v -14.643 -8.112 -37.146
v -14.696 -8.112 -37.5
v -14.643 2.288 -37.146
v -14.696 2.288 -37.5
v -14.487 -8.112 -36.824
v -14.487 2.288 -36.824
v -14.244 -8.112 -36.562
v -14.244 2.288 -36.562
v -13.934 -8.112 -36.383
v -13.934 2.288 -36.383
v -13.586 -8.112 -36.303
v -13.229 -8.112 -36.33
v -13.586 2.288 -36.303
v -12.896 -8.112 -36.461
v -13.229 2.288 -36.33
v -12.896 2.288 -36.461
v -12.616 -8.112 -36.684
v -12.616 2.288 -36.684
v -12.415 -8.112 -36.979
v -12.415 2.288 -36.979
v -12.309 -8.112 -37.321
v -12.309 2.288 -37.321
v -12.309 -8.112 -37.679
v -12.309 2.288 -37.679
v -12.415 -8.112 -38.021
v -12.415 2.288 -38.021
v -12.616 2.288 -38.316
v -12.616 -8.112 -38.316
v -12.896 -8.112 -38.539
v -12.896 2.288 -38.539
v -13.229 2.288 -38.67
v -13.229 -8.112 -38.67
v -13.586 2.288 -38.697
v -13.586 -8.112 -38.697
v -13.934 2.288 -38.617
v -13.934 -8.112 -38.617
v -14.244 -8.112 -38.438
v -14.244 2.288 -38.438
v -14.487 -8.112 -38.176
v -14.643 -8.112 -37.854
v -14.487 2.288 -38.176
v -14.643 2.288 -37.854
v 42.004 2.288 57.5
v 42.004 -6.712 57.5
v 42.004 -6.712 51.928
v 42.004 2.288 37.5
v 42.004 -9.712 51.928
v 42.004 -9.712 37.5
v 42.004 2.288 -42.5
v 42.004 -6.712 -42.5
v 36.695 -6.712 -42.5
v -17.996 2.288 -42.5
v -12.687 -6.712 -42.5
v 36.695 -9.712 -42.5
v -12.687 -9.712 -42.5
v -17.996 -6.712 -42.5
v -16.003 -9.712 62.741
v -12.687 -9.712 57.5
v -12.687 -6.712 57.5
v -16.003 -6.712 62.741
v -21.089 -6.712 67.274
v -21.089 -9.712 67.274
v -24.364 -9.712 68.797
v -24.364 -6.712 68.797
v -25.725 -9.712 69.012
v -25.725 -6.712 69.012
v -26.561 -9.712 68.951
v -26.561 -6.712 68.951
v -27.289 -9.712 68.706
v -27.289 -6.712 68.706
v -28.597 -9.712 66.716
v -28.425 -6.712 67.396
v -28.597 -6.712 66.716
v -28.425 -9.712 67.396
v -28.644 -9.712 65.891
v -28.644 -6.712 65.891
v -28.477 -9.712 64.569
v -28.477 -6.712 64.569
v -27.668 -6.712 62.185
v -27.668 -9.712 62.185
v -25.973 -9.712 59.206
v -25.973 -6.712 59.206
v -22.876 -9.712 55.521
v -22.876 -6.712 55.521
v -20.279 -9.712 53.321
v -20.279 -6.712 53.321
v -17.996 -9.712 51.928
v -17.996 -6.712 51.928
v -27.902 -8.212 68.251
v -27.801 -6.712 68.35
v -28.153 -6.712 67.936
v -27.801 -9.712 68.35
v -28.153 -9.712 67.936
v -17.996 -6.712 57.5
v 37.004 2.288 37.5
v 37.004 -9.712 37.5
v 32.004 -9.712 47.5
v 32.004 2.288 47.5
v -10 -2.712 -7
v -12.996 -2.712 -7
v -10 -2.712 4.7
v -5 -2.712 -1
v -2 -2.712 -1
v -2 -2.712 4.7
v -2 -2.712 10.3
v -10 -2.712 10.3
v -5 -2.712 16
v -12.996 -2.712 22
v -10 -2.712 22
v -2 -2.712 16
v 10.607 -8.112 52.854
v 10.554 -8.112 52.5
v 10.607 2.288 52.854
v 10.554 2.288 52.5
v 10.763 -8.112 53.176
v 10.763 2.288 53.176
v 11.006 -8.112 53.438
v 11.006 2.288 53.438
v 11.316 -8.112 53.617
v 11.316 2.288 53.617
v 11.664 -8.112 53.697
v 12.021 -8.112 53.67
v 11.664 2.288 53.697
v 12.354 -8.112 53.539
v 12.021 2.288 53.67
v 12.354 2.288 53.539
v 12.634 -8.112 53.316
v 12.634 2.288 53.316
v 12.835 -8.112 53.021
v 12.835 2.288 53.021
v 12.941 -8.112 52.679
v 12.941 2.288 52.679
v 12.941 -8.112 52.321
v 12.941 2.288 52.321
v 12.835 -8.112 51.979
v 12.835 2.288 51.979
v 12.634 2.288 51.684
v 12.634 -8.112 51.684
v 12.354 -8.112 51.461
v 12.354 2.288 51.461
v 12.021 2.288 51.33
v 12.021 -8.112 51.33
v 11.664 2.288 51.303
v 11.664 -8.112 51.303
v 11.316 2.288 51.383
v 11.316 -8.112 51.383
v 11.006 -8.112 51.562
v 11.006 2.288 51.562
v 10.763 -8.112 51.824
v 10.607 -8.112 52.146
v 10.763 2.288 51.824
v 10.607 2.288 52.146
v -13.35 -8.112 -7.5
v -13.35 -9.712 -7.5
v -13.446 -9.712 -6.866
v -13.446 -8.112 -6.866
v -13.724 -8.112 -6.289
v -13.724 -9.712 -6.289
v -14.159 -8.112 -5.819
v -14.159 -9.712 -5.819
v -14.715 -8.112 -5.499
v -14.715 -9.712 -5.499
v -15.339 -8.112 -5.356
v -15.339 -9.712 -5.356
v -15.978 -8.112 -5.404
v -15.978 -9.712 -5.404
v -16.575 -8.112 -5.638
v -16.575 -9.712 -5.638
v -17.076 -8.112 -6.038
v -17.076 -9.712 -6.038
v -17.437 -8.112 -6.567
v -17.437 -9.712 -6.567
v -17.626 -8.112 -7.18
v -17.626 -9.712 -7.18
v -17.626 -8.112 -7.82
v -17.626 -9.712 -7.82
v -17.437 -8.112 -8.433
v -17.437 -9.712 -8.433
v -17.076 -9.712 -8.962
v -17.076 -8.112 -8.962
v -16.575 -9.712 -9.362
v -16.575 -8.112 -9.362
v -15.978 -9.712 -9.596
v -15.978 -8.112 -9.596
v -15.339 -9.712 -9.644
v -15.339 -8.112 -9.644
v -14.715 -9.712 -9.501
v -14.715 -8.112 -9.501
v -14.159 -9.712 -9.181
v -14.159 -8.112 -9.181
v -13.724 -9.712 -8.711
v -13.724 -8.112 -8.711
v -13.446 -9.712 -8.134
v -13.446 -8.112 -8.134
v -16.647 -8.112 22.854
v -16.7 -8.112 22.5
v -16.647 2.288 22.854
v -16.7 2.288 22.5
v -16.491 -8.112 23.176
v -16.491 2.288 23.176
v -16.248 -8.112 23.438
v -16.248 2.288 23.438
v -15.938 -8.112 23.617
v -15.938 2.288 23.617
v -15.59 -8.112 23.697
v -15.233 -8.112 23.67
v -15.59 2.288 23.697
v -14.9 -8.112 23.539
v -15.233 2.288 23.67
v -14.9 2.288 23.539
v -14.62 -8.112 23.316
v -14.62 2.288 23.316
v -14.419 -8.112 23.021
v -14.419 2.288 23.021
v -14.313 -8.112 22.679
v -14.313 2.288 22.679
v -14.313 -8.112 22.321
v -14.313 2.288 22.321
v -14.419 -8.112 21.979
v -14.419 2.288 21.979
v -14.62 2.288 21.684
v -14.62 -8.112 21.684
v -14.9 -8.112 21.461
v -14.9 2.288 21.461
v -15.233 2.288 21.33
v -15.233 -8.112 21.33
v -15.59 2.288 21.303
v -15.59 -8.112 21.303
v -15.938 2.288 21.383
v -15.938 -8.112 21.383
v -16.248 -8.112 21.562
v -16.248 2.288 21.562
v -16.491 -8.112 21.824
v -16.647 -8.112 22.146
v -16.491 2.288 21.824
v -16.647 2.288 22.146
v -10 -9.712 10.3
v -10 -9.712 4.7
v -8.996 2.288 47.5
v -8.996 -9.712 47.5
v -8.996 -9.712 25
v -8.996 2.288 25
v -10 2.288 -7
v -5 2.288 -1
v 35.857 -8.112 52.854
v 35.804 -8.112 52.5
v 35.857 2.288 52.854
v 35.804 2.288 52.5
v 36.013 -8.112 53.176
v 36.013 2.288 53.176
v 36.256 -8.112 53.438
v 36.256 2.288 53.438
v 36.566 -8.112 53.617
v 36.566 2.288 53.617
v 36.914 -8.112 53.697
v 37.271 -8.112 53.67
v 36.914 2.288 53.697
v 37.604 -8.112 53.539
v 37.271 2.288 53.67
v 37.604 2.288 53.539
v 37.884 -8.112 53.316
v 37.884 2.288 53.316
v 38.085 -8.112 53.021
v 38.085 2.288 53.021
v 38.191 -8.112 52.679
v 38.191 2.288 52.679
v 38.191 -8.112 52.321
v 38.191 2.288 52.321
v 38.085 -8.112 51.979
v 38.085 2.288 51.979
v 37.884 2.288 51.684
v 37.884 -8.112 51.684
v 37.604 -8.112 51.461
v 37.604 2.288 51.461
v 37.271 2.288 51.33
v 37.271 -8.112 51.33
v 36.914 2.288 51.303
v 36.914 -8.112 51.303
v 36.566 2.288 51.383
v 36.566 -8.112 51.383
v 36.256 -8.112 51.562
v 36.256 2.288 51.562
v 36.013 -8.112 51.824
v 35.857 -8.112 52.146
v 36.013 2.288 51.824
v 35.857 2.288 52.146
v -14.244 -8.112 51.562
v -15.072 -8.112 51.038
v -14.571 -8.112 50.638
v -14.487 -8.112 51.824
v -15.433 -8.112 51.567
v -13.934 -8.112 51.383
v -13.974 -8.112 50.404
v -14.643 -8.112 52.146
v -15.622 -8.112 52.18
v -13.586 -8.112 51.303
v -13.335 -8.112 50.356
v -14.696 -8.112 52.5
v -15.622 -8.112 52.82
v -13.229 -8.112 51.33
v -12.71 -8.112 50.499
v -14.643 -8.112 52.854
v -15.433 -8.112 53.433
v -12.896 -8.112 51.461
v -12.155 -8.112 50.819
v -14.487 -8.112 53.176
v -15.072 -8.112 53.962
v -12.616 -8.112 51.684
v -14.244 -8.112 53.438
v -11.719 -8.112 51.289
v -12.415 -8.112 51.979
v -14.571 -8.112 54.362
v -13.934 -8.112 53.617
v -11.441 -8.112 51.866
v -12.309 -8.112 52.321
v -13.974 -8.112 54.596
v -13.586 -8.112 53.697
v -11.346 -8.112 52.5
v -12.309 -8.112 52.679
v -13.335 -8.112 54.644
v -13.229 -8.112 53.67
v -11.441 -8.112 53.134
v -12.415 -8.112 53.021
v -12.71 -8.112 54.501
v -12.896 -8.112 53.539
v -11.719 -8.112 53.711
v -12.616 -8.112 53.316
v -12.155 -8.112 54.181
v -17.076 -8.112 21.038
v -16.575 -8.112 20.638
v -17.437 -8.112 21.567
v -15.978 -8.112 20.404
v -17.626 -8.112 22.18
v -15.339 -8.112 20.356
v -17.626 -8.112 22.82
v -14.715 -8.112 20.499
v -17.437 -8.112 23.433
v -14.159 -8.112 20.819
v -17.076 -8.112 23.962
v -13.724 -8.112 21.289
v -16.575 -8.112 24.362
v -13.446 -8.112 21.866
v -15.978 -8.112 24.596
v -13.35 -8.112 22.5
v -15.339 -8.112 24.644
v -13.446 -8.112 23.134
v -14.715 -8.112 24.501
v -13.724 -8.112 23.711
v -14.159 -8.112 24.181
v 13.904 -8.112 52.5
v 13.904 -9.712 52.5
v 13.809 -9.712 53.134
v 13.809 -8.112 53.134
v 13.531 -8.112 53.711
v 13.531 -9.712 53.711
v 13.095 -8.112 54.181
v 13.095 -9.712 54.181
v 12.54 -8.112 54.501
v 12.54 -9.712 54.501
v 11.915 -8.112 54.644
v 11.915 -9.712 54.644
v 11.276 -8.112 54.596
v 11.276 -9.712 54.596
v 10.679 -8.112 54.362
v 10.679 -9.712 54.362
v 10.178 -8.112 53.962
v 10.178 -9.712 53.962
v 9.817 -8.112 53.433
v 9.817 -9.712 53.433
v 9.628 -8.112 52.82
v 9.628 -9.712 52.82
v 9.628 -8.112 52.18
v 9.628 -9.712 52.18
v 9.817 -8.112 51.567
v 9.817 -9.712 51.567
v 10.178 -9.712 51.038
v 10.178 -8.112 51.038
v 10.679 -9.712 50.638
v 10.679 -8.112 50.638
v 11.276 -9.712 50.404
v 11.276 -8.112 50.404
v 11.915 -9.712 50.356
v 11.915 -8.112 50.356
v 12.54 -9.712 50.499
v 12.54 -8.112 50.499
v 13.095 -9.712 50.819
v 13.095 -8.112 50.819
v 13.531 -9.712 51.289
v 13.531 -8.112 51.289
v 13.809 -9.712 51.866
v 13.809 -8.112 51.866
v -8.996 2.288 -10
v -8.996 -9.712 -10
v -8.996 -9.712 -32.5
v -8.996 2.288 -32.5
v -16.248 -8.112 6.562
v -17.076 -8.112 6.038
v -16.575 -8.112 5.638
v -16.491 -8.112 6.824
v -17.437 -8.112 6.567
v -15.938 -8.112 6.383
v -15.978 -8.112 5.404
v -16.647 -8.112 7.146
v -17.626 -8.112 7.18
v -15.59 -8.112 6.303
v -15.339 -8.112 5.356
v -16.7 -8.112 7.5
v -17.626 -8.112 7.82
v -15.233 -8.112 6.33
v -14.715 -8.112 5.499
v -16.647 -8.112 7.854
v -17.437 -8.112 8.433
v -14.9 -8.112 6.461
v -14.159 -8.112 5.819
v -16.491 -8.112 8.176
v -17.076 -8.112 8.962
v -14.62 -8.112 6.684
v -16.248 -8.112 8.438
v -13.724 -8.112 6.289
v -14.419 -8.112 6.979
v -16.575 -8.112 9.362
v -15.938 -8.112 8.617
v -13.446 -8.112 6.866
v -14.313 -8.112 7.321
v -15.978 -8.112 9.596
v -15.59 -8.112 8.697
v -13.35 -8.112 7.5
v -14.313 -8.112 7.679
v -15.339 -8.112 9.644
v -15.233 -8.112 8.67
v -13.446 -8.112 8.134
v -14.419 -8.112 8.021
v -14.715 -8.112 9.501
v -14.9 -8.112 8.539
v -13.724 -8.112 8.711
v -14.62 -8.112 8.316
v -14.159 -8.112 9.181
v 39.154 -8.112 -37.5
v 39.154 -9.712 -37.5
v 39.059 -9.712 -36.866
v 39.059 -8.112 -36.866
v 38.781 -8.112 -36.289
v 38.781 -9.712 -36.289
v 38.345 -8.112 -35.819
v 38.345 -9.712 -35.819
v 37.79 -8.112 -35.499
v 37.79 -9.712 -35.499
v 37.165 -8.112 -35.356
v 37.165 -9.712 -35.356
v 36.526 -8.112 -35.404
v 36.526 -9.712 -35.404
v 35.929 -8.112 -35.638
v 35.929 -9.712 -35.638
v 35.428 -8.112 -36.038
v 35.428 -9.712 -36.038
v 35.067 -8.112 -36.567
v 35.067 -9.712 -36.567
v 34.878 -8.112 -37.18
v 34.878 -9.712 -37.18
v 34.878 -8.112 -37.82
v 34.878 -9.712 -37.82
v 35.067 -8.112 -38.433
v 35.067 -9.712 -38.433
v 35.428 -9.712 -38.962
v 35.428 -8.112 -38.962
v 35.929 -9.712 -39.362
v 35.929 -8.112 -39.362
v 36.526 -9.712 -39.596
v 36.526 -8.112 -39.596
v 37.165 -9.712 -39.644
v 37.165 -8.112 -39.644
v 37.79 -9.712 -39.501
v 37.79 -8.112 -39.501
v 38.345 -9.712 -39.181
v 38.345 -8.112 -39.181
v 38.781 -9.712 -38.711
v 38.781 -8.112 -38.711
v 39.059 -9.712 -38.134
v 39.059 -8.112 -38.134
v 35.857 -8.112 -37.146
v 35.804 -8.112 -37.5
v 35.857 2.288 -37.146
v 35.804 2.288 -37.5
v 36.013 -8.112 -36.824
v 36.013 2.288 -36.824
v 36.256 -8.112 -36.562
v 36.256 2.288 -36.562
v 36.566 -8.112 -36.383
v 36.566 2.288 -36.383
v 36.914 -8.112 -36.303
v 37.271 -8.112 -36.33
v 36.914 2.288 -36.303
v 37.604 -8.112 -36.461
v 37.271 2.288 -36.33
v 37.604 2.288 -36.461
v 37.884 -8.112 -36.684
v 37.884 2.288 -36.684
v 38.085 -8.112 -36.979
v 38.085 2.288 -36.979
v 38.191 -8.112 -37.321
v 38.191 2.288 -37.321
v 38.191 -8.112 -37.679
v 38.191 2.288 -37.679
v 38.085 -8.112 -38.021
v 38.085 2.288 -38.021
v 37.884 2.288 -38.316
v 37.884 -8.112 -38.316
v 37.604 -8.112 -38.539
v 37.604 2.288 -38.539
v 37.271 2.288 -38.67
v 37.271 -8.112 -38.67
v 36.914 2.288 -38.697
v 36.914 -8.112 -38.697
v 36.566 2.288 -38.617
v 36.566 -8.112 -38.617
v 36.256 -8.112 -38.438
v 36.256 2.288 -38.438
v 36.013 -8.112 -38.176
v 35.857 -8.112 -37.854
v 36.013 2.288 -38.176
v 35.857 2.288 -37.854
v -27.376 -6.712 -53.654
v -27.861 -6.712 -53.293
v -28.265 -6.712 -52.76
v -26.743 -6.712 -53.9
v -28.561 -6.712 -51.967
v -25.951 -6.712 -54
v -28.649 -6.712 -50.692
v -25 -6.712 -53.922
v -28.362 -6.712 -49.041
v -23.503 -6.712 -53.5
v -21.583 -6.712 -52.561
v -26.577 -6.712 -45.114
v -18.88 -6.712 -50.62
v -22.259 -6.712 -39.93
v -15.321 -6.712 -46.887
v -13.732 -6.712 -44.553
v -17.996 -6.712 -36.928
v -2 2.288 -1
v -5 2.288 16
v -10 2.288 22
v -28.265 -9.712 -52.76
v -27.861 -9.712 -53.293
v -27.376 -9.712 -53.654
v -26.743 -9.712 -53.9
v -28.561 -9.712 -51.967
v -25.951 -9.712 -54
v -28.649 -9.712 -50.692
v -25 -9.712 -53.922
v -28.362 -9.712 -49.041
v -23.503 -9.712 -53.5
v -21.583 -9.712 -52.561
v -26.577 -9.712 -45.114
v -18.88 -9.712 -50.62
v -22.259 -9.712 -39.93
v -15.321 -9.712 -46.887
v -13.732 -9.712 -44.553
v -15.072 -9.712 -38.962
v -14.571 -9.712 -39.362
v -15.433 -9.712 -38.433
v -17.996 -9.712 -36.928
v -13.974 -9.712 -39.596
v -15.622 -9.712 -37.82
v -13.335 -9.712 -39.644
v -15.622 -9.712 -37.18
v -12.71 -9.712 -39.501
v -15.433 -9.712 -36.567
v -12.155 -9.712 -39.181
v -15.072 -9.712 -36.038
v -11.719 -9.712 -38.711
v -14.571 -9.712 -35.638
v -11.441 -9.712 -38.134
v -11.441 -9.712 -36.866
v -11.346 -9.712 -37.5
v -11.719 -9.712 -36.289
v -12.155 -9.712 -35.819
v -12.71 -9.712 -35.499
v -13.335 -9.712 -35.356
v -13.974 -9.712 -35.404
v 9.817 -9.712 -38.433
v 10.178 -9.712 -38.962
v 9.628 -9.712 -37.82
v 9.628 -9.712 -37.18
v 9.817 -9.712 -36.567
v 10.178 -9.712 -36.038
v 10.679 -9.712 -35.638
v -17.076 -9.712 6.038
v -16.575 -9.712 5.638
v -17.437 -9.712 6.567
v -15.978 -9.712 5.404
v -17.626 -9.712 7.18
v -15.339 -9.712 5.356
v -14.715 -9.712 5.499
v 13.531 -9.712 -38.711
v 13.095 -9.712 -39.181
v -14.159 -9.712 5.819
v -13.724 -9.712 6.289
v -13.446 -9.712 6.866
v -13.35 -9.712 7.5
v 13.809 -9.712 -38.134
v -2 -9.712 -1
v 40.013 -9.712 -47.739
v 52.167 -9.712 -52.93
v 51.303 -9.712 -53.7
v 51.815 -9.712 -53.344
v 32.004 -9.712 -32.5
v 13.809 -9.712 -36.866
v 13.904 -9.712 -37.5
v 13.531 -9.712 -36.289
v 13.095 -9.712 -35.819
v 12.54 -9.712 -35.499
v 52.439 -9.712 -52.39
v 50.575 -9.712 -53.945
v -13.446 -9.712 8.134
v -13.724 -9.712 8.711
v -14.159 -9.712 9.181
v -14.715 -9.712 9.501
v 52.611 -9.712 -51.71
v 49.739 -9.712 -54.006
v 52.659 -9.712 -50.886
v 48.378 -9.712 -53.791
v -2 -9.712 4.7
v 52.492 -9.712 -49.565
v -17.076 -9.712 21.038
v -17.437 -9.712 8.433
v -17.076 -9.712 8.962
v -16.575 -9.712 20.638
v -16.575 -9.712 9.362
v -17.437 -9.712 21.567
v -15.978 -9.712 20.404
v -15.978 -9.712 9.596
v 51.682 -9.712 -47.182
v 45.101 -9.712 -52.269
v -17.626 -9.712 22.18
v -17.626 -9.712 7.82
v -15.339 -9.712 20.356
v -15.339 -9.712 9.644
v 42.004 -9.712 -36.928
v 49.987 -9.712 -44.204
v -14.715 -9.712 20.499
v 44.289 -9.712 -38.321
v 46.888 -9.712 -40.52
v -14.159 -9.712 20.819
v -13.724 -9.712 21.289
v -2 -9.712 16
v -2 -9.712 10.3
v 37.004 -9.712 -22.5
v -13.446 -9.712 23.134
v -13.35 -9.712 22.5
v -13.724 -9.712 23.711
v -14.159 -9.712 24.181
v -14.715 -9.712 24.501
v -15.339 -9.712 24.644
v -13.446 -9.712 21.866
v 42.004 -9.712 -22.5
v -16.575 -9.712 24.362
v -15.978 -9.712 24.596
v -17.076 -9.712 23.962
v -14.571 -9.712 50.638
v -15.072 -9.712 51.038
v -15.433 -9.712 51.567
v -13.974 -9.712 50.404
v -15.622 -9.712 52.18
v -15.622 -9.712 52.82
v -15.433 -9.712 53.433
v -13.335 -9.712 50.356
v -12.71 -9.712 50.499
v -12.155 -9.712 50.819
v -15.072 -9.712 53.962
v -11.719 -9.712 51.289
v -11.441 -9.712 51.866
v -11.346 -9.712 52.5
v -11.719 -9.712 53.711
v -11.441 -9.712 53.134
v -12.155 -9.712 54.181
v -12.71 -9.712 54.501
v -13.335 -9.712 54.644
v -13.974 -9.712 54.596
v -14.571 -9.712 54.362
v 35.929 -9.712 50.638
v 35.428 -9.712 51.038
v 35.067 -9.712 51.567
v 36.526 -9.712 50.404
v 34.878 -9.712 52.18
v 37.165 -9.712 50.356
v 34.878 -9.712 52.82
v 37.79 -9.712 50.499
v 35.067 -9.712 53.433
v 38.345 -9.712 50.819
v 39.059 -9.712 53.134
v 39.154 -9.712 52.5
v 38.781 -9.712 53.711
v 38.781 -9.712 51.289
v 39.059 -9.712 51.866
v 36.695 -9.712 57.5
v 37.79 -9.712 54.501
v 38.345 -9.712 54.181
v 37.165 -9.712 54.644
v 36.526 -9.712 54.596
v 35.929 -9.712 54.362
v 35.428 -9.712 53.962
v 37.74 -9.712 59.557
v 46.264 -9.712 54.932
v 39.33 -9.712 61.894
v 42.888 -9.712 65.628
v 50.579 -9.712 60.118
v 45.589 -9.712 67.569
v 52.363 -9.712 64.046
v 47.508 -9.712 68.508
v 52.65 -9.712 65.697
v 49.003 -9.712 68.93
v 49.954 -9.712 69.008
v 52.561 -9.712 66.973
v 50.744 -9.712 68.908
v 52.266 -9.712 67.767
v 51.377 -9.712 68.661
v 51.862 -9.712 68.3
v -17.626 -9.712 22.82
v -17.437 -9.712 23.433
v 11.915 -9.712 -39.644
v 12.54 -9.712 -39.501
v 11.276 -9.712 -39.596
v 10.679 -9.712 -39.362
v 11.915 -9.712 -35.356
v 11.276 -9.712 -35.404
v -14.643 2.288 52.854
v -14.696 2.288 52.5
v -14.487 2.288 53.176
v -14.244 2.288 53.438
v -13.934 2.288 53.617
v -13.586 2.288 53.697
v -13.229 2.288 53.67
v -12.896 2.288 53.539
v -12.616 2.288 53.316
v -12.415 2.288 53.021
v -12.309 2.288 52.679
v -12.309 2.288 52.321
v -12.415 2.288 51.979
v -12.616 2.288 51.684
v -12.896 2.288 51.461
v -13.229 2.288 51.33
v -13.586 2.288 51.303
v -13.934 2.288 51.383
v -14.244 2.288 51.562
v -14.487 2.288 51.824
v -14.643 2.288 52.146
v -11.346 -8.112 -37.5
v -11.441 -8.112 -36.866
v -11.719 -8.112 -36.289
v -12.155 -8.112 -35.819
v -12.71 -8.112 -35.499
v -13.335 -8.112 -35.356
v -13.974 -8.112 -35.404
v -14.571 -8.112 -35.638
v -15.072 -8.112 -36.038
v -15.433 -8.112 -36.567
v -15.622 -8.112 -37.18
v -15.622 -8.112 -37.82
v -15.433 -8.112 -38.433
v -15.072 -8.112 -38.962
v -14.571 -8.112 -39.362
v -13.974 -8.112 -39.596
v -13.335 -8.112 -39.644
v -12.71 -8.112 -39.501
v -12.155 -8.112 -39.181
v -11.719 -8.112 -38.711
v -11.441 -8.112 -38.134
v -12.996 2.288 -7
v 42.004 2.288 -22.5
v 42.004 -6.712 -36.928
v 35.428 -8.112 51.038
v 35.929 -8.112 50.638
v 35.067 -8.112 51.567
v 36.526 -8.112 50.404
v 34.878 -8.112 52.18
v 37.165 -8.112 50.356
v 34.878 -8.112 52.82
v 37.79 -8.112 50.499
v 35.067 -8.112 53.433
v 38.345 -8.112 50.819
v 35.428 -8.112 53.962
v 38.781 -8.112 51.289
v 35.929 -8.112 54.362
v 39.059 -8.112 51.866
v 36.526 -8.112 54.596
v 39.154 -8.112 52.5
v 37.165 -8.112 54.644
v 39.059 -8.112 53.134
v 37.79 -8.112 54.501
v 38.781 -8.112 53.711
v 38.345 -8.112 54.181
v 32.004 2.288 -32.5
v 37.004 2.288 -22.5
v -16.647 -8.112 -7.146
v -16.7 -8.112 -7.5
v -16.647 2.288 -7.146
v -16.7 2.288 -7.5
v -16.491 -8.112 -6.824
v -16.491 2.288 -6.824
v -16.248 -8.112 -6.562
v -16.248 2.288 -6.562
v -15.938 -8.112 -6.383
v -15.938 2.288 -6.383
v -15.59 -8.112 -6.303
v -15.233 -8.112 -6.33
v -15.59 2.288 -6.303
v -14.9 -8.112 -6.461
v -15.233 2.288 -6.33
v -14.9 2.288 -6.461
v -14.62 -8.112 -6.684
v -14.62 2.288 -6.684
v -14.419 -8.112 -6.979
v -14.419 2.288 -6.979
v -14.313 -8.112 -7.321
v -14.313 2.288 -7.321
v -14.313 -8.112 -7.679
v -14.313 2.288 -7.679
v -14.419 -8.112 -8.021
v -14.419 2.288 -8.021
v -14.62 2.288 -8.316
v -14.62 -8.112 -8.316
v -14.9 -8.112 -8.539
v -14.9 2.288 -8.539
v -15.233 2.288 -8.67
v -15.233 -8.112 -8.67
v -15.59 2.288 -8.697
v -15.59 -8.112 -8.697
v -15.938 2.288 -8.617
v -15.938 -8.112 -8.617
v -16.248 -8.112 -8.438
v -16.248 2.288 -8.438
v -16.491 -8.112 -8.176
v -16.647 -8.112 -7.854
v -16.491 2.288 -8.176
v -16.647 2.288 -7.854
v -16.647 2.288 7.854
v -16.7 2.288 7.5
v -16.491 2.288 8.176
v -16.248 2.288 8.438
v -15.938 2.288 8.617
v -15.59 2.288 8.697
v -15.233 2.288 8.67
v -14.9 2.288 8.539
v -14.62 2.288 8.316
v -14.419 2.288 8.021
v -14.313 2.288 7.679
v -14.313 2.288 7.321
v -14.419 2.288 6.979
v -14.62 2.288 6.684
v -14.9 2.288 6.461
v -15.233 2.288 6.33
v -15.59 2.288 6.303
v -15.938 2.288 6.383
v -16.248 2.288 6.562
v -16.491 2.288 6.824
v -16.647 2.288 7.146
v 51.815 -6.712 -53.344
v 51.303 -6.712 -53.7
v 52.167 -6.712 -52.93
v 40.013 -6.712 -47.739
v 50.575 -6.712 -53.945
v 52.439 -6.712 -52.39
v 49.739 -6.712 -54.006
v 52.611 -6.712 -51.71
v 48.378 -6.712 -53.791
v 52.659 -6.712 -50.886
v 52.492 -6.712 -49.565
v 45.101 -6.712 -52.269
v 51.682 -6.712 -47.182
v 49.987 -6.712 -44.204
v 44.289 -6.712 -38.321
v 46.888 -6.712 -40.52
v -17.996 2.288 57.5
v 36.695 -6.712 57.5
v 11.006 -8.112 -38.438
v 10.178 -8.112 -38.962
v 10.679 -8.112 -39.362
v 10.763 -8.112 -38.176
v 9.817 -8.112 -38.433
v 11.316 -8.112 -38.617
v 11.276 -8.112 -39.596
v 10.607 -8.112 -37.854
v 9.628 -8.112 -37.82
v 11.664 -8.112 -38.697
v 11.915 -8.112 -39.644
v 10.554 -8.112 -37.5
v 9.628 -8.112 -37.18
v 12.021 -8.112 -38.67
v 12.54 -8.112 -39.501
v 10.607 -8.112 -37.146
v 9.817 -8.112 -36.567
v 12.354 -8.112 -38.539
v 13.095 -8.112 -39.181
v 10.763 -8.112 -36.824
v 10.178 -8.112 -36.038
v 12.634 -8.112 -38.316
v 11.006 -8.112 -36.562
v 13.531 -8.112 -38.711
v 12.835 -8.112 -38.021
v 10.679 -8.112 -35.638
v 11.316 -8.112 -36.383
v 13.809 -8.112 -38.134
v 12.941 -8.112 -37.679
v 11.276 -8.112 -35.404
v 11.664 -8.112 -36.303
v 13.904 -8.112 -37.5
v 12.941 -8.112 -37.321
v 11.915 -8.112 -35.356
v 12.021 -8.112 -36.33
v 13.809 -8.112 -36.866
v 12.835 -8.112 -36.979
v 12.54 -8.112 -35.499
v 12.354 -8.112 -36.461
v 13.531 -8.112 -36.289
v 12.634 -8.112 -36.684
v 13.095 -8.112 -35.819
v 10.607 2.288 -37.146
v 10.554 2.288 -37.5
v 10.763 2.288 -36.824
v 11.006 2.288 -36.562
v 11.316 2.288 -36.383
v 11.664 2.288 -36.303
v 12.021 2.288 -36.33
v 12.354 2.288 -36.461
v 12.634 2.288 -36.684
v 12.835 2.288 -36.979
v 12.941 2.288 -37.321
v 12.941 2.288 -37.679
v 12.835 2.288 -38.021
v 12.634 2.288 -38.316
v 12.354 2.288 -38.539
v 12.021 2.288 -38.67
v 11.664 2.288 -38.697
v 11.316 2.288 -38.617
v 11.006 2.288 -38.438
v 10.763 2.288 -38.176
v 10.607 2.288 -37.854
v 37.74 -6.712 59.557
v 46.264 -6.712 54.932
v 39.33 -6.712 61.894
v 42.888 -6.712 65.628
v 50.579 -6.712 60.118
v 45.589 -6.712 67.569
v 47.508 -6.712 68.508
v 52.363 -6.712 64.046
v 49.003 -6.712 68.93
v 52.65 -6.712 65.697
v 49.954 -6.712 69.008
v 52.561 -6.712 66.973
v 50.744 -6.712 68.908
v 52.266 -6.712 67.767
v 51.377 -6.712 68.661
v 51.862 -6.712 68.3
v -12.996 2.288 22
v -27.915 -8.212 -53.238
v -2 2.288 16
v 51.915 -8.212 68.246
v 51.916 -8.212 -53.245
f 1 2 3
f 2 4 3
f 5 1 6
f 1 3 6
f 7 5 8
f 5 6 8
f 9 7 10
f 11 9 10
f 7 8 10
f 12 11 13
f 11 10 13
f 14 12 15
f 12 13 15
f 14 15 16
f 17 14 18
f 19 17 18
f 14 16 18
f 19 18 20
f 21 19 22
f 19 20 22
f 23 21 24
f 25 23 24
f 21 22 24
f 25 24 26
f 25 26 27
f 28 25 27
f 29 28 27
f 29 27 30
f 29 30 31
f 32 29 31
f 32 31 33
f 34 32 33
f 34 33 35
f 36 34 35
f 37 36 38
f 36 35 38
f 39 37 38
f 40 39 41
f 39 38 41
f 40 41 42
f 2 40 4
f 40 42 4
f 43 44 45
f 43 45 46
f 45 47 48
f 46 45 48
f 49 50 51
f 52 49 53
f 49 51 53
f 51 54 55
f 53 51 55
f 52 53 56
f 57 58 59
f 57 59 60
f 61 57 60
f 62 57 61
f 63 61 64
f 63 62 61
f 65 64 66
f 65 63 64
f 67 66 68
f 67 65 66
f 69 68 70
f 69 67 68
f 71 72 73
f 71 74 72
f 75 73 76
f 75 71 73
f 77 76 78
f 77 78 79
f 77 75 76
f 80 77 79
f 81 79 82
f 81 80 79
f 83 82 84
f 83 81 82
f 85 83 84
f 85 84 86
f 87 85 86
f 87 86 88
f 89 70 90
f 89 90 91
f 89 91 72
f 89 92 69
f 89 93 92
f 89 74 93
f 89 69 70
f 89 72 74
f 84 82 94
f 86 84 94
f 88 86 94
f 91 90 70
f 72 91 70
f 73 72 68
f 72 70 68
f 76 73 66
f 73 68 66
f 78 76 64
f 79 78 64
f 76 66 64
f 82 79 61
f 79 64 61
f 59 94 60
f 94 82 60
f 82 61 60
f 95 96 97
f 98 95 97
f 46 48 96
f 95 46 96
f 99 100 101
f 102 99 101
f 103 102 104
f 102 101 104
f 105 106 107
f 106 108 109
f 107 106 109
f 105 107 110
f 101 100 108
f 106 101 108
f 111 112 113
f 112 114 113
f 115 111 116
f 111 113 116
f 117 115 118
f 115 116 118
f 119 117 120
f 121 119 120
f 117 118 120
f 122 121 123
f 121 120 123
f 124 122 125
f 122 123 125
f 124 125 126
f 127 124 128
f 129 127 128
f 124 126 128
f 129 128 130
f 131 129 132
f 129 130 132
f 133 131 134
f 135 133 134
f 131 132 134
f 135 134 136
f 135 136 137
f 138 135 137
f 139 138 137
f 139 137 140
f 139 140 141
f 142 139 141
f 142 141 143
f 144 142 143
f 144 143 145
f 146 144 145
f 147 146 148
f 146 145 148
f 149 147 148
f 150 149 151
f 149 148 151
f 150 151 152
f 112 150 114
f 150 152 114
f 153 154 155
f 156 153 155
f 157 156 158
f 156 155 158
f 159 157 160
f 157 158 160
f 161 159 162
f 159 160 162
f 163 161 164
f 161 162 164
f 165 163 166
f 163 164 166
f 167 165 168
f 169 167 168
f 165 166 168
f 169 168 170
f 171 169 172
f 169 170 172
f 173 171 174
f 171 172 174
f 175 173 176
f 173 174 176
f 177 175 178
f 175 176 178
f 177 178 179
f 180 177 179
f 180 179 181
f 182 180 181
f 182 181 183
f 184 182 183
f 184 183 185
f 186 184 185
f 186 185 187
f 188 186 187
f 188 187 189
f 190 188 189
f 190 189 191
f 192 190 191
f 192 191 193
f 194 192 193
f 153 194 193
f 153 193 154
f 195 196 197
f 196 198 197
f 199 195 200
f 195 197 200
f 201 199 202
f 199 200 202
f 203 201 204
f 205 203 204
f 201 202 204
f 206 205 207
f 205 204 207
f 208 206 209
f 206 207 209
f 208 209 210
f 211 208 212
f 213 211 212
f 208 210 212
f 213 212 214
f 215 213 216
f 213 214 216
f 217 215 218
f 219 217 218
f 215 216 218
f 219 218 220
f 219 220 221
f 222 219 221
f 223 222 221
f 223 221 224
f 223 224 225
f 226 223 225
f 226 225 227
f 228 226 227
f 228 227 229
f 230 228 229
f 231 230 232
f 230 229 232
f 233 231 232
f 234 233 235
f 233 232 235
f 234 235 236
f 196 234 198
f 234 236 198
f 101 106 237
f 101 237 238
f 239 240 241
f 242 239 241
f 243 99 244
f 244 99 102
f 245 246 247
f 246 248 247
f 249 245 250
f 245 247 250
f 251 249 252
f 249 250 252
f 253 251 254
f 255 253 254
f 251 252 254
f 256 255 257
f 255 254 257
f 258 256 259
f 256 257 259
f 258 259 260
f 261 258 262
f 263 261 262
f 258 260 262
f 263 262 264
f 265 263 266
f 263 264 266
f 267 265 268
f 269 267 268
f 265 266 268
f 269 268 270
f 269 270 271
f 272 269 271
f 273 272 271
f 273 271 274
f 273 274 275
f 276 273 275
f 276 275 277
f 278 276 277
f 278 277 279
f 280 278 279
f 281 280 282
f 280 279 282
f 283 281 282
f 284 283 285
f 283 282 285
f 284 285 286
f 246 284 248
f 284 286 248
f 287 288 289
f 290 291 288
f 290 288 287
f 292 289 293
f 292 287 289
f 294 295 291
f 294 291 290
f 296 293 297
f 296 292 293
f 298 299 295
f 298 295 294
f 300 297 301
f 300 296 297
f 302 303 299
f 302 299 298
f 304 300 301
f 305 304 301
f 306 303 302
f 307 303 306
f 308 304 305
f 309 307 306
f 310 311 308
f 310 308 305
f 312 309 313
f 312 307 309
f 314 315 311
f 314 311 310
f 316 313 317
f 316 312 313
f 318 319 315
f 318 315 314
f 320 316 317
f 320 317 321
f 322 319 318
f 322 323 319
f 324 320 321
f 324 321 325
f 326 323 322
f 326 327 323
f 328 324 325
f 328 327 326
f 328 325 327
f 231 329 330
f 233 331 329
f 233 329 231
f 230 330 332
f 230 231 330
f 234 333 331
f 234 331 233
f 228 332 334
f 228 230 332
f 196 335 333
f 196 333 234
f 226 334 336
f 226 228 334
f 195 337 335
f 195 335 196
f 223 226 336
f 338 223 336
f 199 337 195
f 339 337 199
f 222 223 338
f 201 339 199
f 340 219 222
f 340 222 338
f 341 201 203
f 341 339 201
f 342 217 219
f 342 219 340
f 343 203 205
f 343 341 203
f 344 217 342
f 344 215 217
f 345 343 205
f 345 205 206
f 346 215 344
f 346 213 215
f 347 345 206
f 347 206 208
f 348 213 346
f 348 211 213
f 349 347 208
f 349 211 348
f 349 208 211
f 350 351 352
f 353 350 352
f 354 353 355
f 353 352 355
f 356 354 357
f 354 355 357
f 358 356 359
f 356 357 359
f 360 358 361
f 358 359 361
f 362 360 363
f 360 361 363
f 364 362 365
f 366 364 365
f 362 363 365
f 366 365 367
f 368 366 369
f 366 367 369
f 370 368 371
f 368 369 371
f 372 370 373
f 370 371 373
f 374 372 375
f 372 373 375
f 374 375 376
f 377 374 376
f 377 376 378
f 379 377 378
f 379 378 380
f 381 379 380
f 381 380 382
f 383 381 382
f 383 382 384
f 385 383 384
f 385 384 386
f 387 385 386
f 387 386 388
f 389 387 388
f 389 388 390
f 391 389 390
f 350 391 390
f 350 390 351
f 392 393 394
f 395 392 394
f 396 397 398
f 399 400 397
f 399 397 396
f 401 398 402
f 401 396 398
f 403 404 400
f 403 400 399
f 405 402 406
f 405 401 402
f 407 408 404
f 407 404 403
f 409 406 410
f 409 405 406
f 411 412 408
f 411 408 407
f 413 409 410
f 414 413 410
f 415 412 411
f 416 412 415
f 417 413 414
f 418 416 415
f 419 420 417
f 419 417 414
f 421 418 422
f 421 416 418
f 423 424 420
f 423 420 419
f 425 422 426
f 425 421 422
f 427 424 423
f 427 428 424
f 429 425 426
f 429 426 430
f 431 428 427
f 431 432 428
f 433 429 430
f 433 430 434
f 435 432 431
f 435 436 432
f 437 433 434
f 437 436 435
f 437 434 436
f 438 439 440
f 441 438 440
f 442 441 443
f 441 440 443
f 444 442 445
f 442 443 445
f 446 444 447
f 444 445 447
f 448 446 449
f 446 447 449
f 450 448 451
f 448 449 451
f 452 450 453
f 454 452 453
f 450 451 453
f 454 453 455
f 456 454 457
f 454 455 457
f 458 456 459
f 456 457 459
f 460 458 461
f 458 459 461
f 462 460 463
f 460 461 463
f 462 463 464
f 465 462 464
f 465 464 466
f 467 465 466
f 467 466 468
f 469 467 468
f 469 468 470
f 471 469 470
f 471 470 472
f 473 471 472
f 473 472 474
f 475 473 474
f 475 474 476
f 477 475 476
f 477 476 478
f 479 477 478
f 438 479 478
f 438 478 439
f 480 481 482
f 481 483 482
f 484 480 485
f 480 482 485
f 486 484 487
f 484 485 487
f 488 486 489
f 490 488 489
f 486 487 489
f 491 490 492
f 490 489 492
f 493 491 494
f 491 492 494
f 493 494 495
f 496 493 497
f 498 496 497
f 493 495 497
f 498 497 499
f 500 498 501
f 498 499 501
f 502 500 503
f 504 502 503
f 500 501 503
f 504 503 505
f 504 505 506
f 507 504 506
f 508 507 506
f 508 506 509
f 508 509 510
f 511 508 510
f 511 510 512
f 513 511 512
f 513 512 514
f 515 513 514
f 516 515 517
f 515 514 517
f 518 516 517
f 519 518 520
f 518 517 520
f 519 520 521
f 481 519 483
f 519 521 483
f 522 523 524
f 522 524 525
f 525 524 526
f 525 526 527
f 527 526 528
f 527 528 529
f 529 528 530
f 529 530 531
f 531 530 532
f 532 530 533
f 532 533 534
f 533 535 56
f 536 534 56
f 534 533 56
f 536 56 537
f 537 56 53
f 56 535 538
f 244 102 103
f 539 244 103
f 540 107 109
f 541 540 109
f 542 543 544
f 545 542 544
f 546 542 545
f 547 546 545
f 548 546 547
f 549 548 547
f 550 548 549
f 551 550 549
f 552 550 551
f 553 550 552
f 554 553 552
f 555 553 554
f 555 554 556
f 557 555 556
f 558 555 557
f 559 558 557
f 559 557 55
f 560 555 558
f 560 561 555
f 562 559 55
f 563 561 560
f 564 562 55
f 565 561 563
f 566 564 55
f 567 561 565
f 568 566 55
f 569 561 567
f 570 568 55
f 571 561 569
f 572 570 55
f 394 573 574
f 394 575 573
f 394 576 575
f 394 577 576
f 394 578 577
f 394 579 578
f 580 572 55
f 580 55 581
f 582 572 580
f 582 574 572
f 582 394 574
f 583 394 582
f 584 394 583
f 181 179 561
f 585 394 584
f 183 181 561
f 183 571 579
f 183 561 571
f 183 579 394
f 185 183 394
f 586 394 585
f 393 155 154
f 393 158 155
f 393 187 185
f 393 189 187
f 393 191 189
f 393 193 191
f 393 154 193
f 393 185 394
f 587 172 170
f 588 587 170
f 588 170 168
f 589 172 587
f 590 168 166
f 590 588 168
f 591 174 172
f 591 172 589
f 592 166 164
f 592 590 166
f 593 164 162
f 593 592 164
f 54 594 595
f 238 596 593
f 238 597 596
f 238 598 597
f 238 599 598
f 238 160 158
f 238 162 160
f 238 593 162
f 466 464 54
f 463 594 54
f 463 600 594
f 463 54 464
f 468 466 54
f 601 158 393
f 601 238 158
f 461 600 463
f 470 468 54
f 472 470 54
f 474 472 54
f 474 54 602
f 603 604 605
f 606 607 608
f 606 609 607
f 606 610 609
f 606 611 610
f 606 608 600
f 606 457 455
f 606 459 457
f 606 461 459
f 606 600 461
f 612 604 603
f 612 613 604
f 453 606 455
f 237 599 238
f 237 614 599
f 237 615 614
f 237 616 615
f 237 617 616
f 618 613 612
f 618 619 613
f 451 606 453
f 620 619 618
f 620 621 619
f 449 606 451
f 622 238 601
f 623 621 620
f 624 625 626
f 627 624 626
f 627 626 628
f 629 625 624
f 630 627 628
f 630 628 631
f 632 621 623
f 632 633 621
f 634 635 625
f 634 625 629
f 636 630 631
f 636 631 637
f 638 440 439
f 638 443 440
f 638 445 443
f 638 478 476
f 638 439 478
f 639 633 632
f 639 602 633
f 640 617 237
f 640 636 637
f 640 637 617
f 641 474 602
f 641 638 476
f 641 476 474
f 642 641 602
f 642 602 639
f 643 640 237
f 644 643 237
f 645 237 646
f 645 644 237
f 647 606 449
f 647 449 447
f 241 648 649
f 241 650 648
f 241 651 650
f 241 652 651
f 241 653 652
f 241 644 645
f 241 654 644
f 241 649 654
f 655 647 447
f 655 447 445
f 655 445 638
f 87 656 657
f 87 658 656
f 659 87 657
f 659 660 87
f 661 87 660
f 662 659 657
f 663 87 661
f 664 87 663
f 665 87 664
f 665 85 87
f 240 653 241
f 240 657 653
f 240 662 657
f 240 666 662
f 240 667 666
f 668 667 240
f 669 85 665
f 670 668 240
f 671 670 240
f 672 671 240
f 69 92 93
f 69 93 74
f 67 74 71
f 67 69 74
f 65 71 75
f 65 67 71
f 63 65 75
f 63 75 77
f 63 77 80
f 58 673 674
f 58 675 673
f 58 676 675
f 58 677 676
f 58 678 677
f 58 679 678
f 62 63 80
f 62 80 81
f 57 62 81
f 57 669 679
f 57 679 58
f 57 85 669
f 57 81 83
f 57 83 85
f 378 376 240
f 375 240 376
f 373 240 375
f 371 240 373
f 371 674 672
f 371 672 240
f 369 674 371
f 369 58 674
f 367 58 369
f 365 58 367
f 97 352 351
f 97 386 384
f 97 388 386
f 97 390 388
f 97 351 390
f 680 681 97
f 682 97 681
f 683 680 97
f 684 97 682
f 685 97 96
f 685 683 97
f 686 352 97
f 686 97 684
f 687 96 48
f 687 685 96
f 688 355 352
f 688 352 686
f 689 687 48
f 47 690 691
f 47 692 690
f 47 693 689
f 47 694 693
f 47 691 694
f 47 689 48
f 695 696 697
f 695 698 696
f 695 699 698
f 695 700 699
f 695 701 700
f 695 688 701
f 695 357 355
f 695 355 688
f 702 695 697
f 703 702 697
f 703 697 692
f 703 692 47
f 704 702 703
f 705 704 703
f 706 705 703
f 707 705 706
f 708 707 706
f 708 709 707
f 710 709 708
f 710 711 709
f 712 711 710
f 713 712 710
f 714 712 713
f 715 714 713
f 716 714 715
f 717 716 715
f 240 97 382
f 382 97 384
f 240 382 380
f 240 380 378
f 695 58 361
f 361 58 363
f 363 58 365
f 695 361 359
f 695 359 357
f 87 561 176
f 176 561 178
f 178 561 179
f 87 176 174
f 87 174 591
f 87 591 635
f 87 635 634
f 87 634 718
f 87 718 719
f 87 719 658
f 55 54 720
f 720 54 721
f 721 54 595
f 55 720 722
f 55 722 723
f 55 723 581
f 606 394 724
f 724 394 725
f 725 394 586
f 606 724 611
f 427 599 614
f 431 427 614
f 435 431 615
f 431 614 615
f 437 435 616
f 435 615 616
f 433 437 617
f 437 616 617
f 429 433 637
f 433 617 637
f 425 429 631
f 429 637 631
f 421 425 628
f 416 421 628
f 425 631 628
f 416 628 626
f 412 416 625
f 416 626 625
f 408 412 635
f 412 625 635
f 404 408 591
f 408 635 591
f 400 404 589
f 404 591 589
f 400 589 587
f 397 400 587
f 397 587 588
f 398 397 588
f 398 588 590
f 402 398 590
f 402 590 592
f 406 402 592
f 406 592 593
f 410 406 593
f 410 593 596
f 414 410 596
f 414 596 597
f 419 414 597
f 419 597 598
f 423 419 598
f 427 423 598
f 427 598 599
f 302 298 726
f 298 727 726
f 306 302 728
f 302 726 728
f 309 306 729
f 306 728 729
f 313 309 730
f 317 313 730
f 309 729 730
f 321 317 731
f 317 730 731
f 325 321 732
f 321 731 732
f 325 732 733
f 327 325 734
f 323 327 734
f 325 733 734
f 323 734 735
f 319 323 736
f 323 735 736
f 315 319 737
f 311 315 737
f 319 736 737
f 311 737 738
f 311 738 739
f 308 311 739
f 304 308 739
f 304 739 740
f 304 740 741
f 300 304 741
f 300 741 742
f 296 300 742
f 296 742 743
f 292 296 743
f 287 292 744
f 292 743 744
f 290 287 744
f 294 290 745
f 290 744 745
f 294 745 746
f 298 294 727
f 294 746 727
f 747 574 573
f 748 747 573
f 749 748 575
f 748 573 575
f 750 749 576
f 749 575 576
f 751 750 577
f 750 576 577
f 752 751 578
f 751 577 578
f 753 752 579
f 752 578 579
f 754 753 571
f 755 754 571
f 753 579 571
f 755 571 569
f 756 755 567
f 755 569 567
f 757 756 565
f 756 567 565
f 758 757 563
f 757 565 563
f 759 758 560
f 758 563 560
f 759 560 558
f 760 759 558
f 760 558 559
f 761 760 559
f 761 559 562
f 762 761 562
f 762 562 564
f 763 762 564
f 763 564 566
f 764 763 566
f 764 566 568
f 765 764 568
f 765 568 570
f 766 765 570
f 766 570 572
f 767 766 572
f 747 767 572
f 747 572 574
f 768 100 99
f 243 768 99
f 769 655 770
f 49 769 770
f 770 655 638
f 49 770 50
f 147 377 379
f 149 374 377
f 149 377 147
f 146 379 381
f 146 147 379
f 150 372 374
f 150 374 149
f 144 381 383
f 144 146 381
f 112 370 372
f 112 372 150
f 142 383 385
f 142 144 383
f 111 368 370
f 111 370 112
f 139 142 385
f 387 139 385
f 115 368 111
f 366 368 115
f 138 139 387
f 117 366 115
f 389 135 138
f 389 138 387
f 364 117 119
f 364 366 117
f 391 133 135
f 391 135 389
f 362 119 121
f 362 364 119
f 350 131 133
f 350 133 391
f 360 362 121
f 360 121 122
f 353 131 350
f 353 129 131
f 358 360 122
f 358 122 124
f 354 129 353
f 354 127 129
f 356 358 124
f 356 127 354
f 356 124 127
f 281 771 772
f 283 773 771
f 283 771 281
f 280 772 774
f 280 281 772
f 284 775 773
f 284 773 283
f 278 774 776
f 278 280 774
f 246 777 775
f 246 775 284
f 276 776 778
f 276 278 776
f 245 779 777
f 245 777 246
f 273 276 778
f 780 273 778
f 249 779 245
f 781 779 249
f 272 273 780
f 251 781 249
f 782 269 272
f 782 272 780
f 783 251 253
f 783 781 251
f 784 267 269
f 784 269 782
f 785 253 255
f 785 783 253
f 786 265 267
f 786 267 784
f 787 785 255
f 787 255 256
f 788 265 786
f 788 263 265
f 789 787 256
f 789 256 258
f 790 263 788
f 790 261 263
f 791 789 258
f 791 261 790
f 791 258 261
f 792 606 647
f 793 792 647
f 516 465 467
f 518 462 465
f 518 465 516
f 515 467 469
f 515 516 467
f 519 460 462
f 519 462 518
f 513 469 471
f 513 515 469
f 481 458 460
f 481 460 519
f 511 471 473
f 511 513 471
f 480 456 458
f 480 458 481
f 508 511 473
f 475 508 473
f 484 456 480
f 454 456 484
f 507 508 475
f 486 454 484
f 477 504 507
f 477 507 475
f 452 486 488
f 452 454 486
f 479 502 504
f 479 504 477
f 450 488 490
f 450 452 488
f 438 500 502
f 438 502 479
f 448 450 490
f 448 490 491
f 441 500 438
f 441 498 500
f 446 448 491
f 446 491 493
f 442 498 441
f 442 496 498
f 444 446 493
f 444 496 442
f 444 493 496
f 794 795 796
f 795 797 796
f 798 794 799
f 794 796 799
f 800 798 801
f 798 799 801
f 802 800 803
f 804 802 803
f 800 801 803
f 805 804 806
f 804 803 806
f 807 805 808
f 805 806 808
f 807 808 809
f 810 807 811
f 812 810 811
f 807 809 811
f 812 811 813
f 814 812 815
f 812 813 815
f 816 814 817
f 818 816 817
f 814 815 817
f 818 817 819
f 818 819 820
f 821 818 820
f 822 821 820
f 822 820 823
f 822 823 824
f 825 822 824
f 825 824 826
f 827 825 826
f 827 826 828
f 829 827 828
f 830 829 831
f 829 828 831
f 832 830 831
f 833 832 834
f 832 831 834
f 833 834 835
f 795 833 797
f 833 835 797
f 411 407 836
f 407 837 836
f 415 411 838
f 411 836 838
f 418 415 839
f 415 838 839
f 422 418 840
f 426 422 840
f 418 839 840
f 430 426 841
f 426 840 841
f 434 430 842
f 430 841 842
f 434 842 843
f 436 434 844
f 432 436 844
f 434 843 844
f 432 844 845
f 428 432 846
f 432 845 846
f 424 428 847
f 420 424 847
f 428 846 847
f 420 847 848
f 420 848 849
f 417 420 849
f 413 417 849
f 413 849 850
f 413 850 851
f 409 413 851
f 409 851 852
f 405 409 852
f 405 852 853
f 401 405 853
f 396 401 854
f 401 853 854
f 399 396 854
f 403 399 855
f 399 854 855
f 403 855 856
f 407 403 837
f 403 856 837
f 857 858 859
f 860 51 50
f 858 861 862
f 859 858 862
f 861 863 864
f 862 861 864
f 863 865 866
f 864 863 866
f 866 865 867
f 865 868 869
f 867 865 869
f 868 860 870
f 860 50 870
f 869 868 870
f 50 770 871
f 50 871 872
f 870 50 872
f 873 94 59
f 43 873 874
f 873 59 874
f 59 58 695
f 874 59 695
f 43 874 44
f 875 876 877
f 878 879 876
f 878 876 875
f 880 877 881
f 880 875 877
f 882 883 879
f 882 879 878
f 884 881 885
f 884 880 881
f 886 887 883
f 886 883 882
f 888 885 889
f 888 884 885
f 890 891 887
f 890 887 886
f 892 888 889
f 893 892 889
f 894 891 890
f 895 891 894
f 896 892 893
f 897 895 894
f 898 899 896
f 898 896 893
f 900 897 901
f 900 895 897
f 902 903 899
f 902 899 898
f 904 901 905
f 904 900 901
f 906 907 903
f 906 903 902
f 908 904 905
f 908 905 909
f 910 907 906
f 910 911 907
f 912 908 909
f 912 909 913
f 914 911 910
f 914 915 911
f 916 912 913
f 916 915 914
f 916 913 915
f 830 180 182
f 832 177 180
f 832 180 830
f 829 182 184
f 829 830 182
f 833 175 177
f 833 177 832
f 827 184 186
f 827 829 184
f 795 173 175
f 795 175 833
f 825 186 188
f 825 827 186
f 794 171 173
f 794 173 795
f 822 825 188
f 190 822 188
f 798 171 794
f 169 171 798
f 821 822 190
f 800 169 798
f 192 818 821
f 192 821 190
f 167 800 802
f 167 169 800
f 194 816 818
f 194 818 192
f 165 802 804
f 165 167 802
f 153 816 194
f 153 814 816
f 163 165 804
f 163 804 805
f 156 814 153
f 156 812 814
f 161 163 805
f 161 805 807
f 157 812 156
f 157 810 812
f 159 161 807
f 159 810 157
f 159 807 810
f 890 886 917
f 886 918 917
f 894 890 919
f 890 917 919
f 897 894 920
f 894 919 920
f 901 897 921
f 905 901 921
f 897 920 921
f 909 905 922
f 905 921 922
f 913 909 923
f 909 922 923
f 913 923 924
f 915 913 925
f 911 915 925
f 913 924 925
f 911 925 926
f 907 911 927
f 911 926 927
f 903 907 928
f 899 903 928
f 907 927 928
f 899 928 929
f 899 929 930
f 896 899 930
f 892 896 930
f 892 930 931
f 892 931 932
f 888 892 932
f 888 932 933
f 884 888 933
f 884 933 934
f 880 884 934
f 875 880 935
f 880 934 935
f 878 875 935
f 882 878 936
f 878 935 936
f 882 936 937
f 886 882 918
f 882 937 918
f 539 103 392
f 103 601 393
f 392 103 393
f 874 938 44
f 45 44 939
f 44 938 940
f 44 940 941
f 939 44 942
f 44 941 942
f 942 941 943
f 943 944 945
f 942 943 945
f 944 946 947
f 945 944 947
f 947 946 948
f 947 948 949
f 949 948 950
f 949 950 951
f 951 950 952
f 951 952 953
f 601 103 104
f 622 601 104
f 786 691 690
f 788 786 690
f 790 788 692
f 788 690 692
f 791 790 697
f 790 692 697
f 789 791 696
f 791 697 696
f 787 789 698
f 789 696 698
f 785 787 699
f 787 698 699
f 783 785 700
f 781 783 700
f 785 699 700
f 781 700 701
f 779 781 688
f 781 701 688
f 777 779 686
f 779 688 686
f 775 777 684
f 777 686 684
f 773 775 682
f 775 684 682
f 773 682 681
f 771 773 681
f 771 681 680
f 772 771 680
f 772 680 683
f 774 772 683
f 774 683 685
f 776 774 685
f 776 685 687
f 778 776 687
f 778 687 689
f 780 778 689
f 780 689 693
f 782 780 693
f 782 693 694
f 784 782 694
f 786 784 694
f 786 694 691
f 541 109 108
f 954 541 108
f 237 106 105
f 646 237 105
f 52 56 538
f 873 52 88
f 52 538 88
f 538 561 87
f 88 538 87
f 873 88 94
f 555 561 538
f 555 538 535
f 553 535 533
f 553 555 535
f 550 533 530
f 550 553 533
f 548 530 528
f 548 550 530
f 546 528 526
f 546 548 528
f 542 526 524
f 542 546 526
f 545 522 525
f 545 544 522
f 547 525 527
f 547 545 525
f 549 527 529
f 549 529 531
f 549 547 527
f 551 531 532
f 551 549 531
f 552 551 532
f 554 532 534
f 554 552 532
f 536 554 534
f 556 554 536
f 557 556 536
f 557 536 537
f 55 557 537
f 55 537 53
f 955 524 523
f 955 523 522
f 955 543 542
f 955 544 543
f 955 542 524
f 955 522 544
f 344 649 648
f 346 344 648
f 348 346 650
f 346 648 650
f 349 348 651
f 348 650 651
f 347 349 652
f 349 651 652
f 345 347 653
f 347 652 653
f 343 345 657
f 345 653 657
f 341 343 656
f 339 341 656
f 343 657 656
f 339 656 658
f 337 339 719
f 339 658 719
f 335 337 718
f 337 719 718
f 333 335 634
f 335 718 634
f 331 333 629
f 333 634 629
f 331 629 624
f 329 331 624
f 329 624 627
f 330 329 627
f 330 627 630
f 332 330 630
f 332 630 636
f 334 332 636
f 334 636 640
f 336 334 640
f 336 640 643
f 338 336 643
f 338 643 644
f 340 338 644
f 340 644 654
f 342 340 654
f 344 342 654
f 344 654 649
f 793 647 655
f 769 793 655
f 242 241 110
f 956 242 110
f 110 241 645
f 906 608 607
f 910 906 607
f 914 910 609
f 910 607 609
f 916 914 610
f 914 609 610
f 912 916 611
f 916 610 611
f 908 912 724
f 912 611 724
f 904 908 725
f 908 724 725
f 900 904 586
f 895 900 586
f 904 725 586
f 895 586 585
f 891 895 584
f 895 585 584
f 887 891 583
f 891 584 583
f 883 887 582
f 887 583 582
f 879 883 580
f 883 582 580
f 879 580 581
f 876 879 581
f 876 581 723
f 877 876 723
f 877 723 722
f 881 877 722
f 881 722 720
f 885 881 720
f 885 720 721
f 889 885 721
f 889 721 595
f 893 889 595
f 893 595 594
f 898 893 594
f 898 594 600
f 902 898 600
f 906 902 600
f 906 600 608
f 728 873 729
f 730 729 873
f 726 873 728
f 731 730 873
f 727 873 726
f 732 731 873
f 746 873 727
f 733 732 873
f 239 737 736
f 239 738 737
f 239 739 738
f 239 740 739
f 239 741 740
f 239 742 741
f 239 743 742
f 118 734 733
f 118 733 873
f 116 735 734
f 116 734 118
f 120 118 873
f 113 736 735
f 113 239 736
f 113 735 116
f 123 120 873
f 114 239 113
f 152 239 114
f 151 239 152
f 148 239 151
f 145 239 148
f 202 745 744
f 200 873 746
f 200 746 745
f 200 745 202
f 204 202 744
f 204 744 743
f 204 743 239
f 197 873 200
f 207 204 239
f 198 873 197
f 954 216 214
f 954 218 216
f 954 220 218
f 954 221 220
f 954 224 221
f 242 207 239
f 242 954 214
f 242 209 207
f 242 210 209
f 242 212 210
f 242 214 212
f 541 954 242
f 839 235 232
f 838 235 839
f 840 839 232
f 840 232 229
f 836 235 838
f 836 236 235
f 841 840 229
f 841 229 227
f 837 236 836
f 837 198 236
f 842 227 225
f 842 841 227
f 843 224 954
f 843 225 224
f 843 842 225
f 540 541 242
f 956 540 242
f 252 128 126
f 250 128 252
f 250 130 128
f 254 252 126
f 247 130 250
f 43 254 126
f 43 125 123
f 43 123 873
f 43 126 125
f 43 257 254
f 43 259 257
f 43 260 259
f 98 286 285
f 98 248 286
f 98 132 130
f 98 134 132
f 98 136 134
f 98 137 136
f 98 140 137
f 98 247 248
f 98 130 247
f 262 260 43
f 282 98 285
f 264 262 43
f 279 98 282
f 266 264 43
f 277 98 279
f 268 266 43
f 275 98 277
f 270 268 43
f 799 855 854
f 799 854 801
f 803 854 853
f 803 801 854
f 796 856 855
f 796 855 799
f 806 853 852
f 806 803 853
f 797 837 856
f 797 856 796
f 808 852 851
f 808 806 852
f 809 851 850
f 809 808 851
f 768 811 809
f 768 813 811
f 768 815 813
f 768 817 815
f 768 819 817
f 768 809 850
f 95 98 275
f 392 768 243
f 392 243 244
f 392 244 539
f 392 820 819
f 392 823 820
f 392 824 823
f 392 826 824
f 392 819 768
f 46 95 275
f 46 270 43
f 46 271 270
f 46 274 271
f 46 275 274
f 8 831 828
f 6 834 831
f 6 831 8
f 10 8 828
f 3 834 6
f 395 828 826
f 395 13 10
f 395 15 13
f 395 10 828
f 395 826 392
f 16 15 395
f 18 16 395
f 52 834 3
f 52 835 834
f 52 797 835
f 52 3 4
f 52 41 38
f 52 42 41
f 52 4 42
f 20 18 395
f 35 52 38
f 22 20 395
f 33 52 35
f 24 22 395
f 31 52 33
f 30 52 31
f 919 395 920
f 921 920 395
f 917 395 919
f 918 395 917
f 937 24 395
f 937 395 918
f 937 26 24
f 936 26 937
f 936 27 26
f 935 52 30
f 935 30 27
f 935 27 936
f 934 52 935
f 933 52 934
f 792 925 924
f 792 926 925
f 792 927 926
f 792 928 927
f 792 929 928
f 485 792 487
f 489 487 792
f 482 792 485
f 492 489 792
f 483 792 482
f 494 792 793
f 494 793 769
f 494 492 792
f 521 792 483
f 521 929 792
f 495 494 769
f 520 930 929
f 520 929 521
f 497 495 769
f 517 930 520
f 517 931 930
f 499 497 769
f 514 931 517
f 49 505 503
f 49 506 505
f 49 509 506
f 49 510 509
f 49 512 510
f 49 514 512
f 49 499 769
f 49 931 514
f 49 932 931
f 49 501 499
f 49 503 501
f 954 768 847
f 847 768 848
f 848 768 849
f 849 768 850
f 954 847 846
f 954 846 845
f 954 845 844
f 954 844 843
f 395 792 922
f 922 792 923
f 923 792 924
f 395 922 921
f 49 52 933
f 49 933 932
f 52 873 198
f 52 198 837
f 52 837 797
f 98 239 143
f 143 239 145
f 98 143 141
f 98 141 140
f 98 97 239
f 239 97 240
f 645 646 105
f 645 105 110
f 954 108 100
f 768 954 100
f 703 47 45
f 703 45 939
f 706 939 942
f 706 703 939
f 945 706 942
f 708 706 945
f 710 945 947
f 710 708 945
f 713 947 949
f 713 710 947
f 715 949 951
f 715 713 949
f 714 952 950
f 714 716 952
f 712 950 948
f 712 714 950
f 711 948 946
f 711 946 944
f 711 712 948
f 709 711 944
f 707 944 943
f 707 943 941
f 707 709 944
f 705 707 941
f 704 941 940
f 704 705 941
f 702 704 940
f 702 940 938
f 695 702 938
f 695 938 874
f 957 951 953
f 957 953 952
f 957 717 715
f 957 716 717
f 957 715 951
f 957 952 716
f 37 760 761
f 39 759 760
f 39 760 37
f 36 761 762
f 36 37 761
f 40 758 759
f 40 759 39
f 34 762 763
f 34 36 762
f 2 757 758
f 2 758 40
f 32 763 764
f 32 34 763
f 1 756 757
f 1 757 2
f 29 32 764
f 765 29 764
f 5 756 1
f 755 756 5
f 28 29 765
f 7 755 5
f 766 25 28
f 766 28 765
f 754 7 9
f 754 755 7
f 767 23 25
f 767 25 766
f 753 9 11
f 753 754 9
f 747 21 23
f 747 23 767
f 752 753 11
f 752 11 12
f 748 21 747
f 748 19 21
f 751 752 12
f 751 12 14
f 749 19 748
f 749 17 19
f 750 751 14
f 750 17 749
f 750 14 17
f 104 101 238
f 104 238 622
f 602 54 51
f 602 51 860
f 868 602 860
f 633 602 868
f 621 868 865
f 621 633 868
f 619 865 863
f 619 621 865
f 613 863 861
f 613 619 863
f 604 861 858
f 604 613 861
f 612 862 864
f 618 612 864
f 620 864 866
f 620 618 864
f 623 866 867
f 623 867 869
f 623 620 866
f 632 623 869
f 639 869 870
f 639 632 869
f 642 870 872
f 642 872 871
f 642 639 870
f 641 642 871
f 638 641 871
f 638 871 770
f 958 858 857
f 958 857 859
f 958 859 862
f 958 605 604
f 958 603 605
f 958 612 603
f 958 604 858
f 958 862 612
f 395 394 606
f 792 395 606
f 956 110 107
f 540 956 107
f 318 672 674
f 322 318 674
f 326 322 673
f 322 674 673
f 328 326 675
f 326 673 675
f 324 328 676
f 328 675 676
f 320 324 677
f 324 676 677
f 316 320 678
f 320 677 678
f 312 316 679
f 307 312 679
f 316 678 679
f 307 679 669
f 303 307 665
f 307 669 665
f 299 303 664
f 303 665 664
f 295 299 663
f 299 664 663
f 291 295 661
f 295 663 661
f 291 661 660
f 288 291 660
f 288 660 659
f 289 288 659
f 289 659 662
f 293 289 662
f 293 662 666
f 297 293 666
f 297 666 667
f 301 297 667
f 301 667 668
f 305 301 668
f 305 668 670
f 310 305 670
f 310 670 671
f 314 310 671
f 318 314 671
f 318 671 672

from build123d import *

# Parameters (mm, degrees)
PAD_DEPTH           = 12
HOLE_D              = 2.4
HOLE_CBORE_D        = 4.3
HOLE_CBORE_DEPTH    = 1.6
HOLE001_D           = 2.4
HOLE001_CBORE_D     = 4.3
HOLE001_CBORE_DEPTH = 1.6
PAD001_DEPTH        = 3
PAD002_DEPTH        = 7
SKETCH005_W         = 10
SKETCH005_H         = 5.6
POCKET_DEPTH        = 7.001


with BuildPart() as part:
    # Sketch001 → Pad (new body)
    with BuildSketch(Plane(origin=(-8.845912, -9.712389, 7.5), x_dir=(1, 0, 0), z_dir=(0, 1, 0))):
        Polygon((3.845912, -8.5), (-1.154088, -14.5), (-4.15, -14.5), (-4.15, 14.5), (-1.154088, 14.5), (3.845912, 8.5), (6.845912, 8.5), (-0.15, 17.5), (-0.15, 40), (40.85, 40), (45.85, 30), (50.85, 30), (50.85, 50), (-9.15, 50), (-9.15, 17.5), (-9.15, -17.5), (-9.15, -50), (50.85, -50), (50.85, -30), (45.85, -30), (40.85, -40), (-0.15, -40), (-0.15, -17.5), (6.845912, -8.5), align=None)
    extrude(amount=PAD_DEPTH)

    # Hole (through all)
    with Locations(Plane(origin=(-8.845912, -9.712389, 7.5), x_dir=(1, 0, 0), z_dir=(0, -1, 0))):
        with Locations((-6.654088, 0), (-6.654088, 15), (-6.654088, -15)):
            CounterBoreHole(HOLE_D / 2, HOLE_CBORE_D / 2, HOLE_CBORE_DEPTH)

    # Hole001 (through all)
    with Locations(Plane(origin=(-8.845912, -9.712389, 7.5), x_dir=(1, 0, 0), z_dir=(0, -1, 0))):
        with Locations((20.6, 45), (20.6, -45), (-4.65, -45), (45.85, -45), (-4.65, 45), (45.85, 45)):
            CounterBoreHole(HOLE001_D / 2, HOLE001_CBORE_D / 2, HOLE001_CBORE_DEPTH)

    # Sketch003 (on Face4 of Hole001) → Pad001 (join)
    with BuildSketch(Plane(origin=(-8.845912, -9.712389, 7.5), x_dir=(1, 0, 0), z_dir=(0, -1, 0))):
        with BuildLine():
            add(Edge.make_bspline(
                [(-3.840829, 50), (-11.66869, 68.504374), (-19.055727, 60.751289), (-26.442764, 52.998203), (-9.15, 44.427744)],
                knots=[4.051188, 4.051188, 4.051188, 6.317319, 6.317319, 8.58345, 8.58345, 8.58345], degree=2, weights=[1, 0.423885, 1, 0.423885, 1]))
            Line((-9.15, 44.427744), (-3.840829, 50))
        make_face()
        with BuildLine():
            add(Edge.make_bspline(
                [(50.85, 44.427744), (68.14745, 52.993644), (60.760992, 60.746122), (53.374534, 68.4986), (45.540829, 50)],
                knots=[3.983179, 3.983179, 3.983179, 6.249274, 6.249274, 8.515368, 8.515368, 8.515368], degree=2, weights=[1, 0.423902, 1, 0.423902, 1]))
            Line((45.540829, 50), (50.85, 44.427744))
        make_face()
        with BuildLine():
            add(Edge.make_bspline(
                [(-9.15, -44.427744), (-26.45485, -52.98644), (-19.069298, -60.737966), (-11.683747, -68.489493), (-3.840829, -50)],
                knots=[3.983587, 3.983587, 3.983587, 6.249624, 6.249624, 8.515661, 8.515661, 8.515661], degree=2, weights=[1, 0.423928, 1, 0.423928, 1]))
            Line((-3.840829, -50), (-9.15, -44.427744))
        make_face()
        with BuildLine():
            add(Edge.make_bspline(
                [(45.540829, -50), (53.375909, -68.497241), (60.762231, -60.744906), (68.148553, -52.99257), (50.85, -44.427744)],
                knots=[4.050959, 4.050959, 4.050959, 6.317045, 6.317045, 8.583131, 8.583131, 8.583131], degree=2, weights=[1, 0.423906, 1, 0.423906, 1]))
            Line((50.85, -44.427744), (45.540829, -50))
        make_face()
    extrude(amount=-PAD001_DEPTH)

    # Sketch004 (on Face4 of Pad001) → Pad002 (join)
    with BuildSketch(Plane(origin=(-8.845912, -9.712389, 7.5), x_dir=(1, 0, 0), z_dir=(0, -1, 0))):
        Polygon((-4.15, 14.5), (-4.15, -14.5), (-1.154088, -14.5), (3.845912, -8.5), (6.845912, -8.5), (6.845912, 8.5), (3.845912, 8.5), (-1.154088, 14.5), align=None)
    extrude(amount=-PAD002_DEPTH)

    # Sketch005 (on Face10 of Pad002) → Pocket (cut, through all)
    with BuildSketch(Plane(origin=(-8.845912, -2.712389, 7.5), x_dir=(1, 0, 0), z_dir=(0, 1, 0))):
        with Locations((3.845912, 0)):
            Rectangle(SKETCH005_W, SKETCH005_H)
    extrude(amount=-POCKET_DEPTH, mode=Mode.SUBTRACT)


solid = part.part
